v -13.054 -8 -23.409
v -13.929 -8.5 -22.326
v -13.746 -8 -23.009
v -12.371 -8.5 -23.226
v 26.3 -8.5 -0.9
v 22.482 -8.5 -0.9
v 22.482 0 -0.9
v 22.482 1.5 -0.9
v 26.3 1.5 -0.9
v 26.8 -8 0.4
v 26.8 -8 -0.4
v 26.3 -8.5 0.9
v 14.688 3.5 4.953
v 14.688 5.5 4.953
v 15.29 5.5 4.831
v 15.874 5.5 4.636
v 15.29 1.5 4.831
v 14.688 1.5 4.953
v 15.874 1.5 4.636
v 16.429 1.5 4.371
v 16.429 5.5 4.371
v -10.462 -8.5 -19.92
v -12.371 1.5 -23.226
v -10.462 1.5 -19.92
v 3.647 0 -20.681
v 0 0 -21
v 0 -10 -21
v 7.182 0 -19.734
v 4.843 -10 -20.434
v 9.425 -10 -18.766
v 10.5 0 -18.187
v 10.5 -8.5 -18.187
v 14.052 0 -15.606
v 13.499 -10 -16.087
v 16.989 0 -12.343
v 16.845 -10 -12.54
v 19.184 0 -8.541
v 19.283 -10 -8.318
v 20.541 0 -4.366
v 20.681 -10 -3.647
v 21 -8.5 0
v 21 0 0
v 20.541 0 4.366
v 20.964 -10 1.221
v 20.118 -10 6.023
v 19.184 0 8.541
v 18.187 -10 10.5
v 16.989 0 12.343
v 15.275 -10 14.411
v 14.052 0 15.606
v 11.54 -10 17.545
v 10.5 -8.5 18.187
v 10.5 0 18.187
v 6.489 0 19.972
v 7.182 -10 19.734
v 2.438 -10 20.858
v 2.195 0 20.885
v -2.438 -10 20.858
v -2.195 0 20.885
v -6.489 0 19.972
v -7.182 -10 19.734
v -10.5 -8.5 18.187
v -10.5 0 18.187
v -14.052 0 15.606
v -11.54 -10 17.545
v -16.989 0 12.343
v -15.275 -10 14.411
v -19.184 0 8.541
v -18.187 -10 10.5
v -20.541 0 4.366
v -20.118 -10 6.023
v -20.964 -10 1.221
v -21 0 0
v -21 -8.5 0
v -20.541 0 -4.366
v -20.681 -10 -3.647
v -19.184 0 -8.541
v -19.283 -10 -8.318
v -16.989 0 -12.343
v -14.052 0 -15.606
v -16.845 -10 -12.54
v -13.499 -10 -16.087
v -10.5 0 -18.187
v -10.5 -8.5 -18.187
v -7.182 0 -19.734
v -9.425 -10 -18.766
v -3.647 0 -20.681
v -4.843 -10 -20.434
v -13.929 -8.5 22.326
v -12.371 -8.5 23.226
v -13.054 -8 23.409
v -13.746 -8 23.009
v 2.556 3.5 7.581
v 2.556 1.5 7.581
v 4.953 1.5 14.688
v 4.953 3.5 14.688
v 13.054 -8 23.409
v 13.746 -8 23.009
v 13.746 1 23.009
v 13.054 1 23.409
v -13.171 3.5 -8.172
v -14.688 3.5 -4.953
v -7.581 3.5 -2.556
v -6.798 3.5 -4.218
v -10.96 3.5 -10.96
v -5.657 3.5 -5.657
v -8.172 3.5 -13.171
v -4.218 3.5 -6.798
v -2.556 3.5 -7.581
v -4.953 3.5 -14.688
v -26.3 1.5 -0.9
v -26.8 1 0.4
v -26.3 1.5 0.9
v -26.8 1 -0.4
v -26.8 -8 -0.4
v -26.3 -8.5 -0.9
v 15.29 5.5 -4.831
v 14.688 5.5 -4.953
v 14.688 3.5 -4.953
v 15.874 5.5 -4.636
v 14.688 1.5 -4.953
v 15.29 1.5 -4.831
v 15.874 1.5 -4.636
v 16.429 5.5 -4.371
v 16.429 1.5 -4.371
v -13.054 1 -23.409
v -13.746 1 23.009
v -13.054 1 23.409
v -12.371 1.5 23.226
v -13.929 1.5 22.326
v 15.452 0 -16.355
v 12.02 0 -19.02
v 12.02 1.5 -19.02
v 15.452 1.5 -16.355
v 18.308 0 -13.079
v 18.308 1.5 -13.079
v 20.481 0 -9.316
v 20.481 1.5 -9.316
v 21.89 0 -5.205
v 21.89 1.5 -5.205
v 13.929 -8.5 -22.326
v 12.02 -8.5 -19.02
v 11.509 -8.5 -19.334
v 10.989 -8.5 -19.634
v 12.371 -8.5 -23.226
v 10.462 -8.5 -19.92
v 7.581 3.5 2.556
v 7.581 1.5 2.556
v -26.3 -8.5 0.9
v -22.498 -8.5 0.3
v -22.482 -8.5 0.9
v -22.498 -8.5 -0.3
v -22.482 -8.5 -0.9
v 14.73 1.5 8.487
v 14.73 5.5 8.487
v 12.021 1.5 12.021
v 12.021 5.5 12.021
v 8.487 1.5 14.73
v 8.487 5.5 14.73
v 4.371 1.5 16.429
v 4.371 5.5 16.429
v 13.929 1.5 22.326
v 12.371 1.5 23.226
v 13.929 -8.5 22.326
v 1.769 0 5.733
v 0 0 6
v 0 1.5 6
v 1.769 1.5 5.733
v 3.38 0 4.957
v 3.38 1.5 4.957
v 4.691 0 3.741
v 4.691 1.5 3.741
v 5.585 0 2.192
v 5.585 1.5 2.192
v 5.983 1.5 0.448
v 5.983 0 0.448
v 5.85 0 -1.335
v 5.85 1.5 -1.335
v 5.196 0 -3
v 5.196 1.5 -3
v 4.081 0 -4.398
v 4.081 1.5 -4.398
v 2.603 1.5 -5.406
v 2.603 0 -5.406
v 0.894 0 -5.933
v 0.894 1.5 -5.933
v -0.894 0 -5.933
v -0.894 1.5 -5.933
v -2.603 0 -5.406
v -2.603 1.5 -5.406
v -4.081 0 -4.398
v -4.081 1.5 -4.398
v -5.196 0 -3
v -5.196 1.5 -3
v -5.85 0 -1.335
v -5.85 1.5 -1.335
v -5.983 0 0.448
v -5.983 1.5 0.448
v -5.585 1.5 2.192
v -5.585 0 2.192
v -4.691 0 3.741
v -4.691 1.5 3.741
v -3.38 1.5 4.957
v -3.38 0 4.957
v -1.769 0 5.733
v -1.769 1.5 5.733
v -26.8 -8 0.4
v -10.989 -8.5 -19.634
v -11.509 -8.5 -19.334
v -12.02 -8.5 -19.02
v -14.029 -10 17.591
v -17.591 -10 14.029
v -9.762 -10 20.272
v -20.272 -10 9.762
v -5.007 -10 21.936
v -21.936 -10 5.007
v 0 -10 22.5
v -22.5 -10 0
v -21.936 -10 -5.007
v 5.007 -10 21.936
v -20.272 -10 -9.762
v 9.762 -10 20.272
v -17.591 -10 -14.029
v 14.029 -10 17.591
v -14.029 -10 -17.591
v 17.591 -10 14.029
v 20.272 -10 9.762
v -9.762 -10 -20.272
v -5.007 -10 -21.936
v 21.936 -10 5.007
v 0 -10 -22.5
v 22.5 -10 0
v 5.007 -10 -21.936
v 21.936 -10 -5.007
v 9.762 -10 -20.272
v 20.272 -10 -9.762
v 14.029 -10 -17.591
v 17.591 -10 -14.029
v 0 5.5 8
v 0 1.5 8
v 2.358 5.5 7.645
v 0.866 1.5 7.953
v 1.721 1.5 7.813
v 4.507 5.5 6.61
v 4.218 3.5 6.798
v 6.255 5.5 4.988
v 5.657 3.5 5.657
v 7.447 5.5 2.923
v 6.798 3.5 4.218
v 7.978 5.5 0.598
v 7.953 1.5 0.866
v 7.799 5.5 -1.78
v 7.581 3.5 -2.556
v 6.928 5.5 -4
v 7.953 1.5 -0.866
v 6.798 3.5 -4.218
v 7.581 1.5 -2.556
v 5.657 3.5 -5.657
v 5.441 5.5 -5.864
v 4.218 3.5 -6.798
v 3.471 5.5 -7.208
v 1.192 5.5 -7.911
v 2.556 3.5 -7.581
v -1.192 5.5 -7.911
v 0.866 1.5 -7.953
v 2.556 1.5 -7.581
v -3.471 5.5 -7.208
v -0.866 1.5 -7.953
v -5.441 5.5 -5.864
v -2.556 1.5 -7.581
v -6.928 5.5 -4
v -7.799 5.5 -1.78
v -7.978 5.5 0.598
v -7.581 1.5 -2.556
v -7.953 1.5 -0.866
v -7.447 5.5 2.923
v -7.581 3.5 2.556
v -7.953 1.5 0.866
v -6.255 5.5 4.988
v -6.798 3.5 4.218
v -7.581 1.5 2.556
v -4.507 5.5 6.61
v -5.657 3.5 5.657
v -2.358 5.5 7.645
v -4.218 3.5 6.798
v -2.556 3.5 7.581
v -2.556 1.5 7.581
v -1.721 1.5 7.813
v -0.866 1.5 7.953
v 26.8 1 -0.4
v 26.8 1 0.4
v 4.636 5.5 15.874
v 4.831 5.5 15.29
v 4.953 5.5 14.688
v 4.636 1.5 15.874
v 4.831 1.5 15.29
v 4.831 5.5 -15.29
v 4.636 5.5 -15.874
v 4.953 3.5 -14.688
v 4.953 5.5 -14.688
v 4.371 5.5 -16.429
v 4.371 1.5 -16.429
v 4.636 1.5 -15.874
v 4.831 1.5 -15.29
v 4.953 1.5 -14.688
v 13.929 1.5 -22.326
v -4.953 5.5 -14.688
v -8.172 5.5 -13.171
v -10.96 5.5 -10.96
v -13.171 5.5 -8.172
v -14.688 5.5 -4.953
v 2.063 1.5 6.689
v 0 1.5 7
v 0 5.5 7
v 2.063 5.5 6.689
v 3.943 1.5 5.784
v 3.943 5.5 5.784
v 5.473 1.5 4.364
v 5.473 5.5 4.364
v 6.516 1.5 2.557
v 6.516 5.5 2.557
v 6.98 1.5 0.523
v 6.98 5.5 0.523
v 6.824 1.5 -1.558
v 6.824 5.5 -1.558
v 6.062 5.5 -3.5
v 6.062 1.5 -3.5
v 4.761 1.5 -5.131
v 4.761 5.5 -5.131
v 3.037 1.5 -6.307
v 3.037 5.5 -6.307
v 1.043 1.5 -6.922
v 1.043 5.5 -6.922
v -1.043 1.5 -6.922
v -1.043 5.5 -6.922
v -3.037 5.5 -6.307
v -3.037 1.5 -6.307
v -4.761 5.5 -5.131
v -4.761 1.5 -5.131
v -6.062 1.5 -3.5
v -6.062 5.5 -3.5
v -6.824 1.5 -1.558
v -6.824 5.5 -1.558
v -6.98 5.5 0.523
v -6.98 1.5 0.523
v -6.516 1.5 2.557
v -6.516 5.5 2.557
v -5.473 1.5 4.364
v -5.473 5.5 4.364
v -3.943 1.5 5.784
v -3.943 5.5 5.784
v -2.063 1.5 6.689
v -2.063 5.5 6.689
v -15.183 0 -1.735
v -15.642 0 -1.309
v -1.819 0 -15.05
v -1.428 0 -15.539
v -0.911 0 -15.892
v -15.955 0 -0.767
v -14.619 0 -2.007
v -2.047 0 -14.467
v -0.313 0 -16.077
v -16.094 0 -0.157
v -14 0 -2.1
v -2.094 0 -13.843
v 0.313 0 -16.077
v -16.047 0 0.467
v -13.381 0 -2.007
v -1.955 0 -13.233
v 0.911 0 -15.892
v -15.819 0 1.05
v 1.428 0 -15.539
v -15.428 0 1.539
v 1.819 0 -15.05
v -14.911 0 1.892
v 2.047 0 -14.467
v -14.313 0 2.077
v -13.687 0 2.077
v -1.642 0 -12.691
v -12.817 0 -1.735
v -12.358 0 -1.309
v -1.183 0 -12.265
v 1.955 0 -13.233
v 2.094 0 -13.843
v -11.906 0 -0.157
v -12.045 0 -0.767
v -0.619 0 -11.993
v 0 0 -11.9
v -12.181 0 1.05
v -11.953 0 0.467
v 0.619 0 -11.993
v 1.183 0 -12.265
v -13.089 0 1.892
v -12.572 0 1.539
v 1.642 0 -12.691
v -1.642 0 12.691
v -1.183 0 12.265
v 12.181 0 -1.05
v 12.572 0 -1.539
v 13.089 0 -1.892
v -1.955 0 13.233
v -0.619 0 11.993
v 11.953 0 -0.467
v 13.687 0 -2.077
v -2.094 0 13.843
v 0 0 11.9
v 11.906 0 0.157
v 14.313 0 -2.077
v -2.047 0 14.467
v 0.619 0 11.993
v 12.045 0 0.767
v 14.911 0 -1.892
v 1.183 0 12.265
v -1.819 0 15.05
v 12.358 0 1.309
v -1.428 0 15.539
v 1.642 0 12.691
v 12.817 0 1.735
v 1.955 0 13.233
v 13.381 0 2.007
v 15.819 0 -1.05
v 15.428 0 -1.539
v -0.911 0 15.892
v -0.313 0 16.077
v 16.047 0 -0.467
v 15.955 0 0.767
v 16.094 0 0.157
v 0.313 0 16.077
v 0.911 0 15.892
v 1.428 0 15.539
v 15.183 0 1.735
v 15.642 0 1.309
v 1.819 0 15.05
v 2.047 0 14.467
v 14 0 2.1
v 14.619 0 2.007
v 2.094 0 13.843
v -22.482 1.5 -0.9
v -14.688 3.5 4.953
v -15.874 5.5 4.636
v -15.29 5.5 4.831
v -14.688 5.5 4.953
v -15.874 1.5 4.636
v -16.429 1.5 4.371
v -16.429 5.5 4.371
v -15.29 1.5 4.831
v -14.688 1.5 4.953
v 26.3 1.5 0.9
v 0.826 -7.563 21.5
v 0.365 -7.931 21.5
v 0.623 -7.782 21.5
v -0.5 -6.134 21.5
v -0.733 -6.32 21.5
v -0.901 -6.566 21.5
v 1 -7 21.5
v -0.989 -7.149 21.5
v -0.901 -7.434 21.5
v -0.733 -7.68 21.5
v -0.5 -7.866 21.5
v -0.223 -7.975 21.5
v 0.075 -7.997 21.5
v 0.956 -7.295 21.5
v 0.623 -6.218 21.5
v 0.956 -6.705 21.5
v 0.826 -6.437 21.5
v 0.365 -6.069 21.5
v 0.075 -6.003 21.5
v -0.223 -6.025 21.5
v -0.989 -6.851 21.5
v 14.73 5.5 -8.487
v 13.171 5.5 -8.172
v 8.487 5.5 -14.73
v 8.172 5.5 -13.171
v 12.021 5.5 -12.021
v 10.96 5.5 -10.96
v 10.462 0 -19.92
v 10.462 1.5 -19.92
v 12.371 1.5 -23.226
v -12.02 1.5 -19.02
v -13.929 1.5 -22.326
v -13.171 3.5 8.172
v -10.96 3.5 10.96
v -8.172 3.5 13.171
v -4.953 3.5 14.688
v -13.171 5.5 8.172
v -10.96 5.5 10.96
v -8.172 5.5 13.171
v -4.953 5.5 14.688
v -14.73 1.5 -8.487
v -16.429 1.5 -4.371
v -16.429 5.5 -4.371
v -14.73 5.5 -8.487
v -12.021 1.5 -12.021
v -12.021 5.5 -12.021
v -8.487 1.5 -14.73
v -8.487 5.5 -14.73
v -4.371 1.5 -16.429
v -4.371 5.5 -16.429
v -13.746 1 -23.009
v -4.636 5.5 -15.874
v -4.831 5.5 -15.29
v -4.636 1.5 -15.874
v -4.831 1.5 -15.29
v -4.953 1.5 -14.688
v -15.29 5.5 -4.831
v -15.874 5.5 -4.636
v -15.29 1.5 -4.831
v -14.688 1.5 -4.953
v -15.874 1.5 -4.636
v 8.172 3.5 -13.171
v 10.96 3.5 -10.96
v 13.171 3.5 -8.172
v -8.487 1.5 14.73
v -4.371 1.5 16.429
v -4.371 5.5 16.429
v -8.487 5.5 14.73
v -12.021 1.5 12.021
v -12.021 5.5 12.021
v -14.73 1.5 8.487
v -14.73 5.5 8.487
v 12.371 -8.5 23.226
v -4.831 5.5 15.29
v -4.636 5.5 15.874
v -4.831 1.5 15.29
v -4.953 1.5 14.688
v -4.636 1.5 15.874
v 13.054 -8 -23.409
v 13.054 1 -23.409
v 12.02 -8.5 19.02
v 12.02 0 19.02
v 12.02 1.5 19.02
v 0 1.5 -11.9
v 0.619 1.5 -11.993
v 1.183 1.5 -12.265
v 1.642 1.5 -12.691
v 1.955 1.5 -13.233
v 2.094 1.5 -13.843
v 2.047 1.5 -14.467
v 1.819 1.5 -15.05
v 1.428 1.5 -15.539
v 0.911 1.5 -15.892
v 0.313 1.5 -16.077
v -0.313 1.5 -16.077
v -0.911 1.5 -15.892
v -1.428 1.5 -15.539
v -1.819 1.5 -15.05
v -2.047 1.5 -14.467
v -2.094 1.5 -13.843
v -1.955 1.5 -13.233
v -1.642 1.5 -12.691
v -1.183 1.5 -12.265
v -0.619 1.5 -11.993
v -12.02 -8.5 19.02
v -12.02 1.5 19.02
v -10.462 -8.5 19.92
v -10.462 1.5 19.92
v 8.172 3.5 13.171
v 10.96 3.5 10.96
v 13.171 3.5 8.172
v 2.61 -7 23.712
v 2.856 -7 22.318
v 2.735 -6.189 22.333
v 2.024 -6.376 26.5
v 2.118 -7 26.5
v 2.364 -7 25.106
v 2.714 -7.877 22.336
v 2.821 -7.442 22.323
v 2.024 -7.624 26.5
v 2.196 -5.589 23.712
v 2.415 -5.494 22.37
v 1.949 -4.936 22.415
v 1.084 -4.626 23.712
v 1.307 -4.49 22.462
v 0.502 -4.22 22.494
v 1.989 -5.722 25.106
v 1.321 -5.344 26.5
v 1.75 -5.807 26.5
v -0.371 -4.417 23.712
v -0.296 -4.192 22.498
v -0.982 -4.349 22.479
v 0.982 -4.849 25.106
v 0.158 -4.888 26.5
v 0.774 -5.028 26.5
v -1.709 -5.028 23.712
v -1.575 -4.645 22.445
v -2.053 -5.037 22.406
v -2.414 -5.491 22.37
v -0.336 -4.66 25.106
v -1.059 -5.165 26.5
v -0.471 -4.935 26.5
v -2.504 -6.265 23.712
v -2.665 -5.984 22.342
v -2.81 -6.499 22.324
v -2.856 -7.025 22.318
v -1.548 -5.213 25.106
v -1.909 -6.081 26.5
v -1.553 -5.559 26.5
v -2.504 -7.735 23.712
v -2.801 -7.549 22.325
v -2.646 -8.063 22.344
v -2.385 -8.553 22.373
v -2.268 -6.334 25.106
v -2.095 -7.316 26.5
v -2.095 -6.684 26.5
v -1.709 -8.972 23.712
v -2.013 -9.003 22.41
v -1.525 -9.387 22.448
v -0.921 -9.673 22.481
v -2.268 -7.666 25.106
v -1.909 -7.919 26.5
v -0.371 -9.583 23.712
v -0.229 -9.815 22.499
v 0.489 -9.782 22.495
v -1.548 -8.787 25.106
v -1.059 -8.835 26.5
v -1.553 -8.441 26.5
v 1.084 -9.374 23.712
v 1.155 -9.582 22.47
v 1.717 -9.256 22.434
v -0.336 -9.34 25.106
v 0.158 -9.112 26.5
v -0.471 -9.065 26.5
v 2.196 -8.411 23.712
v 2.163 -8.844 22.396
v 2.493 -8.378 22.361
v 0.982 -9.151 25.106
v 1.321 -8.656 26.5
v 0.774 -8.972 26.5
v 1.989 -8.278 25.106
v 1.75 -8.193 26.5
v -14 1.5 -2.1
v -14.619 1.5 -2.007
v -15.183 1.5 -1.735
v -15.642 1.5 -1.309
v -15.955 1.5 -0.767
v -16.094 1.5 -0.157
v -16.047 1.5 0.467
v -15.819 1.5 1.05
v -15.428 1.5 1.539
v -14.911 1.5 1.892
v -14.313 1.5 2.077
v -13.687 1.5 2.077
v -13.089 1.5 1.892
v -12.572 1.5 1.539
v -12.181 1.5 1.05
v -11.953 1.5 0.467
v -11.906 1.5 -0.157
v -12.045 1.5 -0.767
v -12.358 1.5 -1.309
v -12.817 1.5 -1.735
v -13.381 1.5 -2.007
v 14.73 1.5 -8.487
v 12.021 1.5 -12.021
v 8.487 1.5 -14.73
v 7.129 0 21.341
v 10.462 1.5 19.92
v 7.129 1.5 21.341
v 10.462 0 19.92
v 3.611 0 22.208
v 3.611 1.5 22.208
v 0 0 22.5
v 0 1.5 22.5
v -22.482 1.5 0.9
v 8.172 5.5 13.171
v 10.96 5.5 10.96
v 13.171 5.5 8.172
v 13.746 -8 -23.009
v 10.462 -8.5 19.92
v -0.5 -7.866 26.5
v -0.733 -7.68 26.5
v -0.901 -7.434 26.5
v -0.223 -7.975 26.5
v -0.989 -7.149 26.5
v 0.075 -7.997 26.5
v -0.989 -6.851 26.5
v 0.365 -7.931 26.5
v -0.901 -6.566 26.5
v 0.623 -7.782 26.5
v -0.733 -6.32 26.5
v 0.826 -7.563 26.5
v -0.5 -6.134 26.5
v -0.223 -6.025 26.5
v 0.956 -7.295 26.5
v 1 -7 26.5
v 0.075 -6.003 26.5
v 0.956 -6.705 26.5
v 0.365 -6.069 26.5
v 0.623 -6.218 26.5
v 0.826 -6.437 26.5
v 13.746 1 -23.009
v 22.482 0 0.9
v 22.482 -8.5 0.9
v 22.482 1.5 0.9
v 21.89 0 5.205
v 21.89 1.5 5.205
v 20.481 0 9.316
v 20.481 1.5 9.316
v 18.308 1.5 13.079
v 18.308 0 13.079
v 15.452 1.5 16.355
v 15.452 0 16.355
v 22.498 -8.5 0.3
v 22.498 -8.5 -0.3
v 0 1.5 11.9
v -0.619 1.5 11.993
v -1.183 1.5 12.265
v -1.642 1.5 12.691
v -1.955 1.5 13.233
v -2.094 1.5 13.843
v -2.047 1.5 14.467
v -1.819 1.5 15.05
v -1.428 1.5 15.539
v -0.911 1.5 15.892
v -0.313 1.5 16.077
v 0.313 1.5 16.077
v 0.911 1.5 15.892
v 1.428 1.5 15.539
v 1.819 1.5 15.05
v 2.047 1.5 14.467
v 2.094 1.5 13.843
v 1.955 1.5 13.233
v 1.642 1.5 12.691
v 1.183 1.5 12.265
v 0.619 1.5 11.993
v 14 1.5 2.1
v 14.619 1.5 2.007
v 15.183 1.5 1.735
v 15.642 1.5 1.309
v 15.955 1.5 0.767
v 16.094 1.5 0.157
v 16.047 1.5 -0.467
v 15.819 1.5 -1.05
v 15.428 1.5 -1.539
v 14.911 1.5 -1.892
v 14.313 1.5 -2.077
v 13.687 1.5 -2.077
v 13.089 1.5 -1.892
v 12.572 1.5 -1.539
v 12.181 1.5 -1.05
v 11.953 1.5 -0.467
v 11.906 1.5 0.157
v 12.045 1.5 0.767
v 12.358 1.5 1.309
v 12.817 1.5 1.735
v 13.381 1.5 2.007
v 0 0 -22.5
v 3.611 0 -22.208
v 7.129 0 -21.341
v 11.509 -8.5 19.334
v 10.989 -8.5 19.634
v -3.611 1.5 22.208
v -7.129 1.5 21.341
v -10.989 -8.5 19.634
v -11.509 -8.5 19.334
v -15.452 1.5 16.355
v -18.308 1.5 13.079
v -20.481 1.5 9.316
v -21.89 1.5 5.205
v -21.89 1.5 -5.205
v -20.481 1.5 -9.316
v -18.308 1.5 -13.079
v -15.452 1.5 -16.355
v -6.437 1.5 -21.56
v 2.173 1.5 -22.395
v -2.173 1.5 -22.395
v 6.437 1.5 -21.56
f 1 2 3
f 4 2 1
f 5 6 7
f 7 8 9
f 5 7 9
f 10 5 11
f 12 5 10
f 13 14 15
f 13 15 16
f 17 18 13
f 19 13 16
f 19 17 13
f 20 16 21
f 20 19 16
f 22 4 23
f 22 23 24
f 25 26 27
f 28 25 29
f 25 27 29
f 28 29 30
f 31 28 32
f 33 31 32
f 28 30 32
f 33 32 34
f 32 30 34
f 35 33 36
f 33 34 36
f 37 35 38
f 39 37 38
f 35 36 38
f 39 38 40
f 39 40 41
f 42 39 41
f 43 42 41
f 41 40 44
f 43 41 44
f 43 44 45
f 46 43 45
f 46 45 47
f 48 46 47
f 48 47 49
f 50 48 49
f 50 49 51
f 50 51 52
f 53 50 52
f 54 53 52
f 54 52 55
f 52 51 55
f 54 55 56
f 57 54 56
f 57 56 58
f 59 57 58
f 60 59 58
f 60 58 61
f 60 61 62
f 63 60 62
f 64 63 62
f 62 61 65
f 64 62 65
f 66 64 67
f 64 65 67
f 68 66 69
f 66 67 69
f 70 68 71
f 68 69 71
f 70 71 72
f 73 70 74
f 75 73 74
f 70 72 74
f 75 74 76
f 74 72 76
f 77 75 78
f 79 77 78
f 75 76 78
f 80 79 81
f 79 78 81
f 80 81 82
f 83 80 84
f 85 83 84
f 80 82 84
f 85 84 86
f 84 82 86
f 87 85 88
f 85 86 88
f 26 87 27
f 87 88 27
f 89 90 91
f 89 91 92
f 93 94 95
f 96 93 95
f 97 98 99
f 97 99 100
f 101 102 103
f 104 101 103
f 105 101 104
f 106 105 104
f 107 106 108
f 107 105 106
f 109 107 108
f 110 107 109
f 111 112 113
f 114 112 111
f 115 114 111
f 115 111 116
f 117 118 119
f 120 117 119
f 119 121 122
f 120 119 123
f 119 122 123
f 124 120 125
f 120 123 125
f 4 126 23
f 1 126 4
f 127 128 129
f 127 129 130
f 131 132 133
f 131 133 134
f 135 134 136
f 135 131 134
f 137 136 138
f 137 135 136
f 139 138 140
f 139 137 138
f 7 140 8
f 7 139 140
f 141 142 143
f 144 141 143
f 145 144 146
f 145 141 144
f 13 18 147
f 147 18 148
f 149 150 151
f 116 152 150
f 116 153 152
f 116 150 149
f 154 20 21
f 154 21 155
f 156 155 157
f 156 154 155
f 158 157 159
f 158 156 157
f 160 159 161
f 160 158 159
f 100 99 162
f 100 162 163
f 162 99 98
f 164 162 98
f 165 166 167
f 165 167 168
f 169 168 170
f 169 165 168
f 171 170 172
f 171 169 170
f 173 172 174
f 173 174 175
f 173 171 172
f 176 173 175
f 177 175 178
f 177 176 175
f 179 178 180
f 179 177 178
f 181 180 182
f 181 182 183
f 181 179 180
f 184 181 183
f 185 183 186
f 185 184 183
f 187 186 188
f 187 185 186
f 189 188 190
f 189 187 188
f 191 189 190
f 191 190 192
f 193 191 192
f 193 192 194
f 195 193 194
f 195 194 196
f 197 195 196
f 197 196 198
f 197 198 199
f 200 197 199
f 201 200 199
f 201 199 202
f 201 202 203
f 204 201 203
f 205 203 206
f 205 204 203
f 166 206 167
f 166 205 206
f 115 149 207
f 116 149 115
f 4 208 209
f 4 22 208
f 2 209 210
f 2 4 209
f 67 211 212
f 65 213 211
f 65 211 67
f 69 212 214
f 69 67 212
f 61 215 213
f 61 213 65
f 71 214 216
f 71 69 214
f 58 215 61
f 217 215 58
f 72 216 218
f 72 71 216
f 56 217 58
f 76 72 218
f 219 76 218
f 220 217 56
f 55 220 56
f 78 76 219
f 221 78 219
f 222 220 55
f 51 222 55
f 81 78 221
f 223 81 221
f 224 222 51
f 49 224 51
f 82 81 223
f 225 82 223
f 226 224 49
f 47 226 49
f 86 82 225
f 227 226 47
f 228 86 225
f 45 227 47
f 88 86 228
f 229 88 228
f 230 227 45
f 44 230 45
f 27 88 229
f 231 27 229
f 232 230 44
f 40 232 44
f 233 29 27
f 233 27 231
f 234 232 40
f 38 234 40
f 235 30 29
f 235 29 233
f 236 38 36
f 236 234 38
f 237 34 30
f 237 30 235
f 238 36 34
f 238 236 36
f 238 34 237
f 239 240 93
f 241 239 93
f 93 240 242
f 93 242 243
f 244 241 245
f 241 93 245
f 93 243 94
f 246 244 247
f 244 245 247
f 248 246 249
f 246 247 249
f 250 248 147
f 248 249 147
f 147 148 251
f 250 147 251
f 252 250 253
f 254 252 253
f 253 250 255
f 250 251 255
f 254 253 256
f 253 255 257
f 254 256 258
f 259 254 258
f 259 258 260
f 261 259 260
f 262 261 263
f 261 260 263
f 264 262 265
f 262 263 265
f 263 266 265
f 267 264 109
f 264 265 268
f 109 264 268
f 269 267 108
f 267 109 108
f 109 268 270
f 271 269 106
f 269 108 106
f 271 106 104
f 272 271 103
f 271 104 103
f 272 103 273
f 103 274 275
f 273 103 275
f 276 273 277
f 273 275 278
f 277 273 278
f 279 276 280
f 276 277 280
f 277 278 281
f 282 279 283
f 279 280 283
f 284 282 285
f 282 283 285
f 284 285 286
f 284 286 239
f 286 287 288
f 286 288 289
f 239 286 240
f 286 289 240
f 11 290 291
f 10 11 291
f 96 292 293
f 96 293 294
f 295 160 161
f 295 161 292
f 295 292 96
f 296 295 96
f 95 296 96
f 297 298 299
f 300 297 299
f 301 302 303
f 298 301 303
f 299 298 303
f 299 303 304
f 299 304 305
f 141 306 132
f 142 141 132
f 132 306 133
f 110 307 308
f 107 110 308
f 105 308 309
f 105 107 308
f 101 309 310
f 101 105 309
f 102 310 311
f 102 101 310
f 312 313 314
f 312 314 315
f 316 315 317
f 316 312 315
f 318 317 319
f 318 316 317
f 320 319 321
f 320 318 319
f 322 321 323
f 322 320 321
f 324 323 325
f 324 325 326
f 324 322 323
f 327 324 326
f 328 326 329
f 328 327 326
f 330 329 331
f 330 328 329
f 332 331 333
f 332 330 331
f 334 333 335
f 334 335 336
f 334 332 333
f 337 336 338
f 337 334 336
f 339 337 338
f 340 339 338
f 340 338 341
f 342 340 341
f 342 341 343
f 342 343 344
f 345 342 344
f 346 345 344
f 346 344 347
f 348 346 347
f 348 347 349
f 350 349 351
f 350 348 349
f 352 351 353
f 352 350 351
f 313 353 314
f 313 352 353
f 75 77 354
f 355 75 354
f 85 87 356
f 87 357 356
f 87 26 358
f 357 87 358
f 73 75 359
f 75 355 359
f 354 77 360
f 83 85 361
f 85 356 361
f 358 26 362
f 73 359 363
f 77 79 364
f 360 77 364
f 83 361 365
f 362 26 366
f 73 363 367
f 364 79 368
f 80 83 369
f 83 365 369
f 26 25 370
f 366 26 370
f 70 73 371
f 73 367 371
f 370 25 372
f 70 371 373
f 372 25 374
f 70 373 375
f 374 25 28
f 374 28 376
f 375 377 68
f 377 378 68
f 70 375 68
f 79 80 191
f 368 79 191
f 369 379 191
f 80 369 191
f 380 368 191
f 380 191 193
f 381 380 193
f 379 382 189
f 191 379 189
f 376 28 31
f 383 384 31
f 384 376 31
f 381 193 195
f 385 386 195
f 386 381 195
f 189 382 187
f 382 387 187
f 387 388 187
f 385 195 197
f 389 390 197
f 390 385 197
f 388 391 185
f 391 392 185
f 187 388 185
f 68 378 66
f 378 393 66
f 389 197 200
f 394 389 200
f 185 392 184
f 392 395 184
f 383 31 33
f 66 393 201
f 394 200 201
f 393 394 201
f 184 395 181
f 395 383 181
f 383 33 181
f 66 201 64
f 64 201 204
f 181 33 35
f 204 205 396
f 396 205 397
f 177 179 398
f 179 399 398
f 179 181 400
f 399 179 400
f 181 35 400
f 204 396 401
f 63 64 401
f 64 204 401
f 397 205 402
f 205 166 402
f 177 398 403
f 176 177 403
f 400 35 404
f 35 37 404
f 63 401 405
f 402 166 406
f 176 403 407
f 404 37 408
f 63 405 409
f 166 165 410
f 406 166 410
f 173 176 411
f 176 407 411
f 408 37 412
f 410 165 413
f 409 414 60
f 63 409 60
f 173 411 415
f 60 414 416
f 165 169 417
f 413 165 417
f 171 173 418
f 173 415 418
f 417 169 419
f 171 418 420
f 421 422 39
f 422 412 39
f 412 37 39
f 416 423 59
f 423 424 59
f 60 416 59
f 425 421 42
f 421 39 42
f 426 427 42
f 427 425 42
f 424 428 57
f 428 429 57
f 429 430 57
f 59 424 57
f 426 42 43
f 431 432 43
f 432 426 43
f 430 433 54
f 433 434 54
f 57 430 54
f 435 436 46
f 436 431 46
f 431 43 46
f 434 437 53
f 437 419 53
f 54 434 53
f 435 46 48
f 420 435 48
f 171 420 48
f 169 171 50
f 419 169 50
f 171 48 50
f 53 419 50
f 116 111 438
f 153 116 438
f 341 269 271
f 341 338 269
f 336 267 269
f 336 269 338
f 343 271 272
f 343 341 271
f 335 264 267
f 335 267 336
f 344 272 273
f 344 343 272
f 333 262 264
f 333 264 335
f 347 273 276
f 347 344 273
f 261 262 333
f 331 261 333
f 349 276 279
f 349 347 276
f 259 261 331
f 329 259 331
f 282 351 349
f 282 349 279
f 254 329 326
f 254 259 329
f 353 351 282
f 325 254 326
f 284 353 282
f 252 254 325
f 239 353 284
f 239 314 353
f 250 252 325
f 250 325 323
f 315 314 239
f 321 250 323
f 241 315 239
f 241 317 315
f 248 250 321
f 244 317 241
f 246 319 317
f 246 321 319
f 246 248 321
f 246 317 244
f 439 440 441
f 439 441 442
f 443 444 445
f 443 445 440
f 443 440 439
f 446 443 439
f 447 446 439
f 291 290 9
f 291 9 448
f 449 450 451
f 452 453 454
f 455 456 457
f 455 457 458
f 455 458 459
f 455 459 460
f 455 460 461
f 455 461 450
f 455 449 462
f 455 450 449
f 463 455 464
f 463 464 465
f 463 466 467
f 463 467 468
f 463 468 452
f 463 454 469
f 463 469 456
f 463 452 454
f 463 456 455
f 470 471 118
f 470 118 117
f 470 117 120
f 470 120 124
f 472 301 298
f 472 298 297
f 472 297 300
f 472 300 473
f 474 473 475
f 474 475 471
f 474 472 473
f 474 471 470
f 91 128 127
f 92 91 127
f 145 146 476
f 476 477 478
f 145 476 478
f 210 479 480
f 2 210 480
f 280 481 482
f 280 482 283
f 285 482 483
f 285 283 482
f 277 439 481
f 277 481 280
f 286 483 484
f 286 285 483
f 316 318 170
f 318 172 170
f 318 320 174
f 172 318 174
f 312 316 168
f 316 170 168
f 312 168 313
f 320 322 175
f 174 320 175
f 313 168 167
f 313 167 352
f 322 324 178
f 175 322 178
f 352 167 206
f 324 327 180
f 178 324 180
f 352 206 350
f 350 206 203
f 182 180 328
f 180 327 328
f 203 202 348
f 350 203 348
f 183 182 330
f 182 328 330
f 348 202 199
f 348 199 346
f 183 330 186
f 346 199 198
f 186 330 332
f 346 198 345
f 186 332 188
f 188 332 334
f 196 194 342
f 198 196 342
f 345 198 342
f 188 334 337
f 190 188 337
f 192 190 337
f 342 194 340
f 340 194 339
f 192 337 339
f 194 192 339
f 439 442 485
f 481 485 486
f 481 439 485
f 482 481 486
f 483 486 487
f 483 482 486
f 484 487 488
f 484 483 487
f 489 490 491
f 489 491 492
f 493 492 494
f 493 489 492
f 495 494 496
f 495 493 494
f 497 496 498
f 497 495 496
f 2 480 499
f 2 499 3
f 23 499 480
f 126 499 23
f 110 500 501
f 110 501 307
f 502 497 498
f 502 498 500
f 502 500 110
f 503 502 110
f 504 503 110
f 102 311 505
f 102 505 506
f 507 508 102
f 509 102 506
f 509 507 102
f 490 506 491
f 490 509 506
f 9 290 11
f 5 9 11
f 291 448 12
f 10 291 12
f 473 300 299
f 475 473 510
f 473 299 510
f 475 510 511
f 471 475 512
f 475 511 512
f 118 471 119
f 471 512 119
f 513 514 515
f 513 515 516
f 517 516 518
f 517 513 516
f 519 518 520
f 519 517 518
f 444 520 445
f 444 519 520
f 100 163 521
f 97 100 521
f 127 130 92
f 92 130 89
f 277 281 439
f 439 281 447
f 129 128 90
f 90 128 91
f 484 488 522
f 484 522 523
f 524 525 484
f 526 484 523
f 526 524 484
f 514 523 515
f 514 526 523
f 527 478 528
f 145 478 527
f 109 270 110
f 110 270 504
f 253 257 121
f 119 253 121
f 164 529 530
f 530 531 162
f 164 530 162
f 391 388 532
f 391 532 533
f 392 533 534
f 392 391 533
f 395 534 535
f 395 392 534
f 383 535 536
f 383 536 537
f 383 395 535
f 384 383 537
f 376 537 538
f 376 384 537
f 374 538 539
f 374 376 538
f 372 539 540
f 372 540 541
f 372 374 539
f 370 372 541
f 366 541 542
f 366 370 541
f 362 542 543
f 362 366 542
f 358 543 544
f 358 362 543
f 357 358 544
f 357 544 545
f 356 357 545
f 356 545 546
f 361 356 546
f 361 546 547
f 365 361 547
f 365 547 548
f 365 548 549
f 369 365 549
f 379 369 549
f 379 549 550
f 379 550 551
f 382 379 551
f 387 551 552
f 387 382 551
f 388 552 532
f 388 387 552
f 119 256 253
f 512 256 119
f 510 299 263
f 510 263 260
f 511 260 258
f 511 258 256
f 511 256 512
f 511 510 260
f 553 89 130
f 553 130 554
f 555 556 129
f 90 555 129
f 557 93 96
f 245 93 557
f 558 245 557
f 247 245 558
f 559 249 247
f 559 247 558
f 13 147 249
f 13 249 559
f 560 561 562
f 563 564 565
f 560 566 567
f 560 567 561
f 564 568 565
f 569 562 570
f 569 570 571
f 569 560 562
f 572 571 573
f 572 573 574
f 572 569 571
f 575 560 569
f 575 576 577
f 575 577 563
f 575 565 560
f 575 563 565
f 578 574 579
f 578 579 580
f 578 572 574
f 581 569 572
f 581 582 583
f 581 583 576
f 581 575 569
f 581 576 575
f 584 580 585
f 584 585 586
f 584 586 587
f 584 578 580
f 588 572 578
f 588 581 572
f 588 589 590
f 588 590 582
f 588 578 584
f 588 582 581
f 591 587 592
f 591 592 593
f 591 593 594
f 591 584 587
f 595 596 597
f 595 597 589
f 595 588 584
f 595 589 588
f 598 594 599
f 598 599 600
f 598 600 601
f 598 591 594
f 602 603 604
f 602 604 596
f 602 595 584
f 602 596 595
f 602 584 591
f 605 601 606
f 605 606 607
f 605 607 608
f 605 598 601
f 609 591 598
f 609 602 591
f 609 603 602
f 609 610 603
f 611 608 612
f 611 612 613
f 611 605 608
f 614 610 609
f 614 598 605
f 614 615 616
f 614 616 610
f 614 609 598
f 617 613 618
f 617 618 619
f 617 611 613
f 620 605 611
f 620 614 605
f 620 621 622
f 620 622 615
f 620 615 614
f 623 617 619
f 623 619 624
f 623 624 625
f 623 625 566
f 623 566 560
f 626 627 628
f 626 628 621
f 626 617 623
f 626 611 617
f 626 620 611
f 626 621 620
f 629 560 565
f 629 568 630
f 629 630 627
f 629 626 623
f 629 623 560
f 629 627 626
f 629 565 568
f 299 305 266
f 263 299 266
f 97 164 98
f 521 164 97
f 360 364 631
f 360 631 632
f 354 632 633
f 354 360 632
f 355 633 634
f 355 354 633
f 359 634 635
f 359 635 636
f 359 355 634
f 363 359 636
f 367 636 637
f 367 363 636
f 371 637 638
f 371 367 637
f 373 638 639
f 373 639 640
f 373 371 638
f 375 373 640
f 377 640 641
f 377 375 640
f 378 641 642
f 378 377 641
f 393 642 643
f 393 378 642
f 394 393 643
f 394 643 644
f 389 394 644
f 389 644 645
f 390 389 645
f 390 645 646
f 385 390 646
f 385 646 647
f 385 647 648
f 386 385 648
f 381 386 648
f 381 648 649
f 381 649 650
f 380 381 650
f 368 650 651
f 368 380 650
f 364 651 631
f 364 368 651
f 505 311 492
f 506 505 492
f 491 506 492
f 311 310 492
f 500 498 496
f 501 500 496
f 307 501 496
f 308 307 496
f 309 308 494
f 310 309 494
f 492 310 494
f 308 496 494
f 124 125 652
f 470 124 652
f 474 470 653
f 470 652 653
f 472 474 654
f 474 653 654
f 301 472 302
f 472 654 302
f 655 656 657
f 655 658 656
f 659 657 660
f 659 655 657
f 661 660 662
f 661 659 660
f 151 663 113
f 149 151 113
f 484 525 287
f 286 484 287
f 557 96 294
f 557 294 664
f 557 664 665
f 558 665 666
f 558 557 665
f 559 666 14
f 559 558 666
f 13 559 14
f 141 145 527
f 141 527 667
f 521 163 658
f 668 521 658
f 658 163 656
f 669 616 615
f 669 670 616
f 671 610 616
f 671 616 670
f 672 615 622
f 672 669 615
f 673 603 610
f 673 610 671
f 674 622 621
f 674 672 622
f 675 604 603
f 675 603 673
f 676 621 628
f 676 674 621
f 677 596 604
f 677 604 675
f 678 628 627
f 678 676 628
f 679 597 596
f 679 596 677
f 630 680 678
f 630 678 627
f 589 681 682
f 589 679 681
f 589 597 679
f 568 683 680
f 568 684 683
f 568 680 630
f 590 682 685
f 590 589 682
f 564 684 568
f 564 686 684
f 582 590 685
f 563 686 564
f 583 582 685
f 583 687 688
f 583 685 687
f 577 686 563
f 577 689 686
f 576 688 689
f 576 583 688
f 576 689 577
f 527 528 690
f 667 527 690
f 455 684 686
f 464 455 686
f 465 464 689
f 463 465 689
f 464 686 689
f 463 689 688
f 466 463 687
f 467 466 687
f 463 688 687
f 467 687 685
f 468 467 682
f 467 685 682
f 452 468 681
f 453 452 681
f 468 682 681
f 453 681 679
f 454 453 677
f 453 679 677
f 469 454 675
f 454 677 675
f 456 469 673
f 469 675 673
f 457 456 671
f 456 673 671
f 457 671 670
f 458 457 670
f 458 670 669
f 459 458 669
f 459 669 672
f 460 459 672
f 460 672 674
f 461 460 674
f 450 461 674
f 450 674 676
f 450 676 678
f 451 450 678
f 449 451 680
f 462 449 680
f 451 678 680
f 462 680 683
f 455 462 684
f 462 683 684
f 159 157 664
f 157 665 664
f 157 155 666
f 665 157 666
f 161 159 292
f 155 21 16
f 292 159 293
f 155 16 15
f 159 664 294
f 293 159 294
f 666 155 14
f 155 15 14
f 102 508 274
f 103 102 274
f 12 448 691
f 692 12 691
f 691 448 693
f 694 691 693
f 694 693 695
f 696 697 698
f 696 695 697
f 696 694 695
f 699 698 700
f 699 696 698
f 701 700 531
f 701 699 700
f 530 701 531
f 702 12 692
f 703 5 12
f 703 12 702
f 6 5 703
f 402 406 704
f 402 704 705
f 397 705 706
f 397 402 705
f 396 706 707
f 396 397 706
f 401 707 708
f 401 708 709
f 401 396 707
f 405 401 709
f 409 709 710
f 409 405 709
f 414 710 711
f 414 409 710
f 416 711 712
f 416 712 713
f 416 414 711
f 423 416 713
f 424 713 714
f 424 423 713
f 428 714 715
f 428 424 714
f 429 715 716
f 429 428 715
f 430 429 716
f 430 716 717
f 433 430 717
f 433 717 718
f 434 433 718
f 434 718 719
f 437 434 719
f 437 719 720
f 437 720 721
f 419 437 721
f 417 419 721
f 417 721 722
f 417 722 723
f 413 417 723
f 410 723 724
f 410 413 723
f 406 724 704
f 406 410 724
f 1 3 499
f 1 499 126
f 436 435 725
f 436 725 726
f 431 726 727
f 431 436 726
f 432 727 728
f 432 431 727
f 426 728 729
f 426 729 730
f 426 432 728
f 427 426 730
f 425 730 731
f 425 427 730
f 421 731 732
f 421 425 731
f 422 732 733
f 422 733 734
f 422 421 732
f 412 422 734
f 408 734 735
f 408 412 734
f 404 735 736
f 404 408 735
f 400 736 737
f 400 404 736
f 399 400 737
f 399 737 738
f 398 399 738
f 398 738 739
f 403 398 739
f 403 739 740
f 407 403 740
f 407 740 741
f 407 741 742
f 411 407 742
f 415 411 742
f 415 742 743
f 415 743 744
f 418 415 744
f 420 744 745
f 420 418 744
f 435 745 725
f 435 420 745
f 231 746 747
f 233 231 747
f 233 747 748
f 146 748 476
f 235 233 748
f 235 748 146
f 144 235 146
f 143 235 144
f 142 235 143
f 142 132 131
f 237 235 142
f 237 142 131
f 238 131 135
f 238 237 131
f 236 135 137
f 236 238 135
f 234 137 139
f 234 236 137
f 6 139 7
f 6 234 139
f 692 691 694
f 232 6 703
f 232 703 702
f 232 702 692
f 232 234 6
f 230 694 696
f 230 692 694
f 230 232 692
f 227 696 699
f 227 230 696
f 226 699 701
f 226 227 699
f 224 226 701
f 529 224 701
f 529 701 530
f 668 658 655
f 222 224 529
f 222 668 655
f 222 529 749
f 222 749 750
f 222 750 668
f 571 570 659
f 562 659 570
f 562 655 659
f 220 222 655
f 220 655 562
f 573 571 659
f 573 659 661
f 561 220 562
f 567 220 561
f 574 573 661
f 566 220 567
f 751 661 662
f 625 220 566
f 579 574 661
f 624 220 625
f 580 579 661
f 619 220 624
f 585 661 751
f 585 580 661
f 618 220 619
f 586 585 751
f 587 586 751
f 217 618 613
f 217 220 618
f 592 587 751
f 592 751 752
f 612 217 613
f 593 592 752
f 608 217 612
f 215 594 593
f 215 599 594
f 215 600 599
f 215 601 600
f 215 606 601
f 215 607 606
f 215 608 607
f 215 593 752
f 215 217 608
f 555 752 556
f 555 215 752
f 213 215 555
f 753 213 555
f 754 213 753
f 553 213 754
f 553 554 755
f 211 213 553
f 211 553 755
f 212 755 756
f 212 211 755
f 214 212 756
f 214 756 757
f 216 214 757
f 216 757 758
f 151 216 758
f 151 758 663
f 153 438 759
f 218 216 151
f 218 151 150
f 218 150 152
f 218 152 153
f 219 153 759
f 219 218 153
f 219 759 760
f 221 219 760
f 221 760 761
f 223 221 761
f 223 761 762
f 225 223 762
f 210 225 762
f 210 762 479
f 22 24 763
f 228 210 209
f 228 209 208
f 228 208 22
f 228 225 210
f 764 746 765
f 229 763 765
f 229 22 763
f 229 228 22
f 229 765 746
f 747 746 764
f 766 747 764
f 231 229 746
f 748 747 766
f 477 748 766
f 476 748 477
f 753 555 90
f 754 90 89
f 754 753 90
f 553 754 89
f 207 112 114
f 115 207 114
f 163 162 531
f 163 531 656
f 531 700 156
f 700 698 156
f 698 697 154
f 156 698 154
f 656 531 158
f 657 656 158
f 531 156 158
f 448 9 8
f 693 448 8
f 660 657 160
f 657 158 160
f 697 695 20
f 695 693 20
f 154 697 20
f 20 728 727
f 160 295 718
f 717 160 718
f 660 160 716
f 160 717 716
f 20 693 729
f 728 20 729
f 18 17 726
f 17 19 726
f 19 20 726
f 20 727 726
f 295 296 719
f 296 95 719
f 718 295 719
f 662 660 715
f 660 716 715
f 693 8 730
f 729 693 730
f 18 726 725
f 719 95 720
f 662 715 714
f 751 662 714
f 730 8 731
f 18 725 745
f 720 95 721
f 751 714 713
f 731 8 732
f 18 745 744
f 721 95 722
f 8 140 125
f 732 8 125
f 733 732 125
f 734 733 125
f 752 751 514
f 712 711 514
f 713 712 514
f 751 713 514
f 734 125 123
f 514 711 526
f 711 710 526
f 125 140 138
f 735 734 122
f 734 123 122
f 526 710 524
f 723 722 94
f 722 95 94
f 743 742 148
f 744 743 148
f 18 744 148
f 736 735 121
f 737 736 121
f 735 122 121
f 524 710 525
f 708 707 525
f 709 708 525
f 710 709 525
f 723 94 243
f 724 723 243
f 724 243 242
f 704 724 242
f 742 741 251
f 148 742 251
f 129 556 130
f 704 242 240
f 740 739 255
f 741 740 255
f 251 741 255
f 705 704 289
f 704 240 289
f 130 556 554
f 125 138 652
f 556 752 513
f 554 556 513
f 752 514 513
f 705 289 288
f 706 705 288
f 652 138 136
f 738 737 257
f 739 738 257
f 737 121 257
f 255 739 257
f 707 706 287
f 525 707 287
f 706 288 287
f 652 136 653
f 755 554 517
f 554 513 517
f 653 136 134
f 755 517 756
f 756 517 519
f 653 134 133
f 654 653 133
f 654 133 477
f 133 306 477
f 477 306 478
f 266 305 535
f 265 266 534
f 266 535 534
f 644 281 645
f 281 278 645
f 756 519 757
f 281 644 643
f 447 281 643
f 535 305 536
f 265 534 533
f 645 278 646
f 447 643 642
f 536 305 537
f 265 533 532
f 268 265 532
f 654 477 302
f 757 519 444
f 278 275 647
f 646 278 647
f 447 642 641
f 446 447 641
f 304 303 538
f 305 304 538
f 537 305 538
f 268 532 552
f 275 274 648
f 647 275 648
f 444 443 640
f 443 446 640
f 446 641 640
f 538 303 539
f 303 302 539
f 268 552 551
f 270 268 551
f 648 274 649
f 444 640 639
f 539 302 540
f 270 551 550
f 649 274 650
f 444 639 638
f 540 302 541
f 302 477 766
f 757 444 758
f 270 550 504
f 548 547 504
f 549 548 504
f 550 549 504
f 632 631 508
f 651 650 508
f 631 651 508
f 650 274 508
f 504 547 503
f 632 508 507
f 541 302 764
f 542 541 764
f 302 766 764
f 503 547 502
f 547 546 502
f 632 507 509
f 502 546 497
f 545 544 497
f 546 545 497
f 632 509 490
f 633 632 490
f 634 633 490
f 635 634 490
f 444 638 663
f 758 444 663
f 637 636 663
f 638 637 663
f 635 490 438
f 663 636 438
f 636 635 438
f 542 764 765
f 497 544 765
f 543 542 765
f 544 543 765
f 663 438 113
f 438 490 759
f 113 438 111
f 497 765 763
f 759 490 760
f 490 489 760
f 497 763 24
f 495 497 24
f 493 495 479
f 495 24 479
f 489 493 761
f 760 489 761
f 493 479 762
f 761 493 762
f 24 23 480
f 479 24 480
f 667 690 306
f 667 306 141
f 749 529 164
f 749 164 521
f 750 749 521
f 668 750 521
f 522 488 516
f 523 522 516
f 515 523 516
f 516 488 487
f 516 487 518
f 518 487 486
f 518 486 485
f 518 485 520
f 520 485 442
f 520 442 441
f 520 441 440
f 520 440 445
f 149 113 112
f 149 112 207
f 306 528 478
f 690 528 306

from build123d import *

# Parameters (mm, degrees)
SKETCH_2_R          = 22.5
SKETCH_2_R_2        = 2.0999999999999956
SKETCH_2_R_3        = 2.1
SKETCH_2_R_4        = 2.0999999999999974
SKETCH_2_R_5        = 6
EXTRUDE_1_DEPTH     = 1.5
EXTRUDE_START       = 10
SKETCH_4_R          = 22.500000000000004
SKETCH_4_R_2        = 21
EXTRUDE_2_DEPTH     = 10
EXTRUDE_3_DEPTH     = 10
SKETCH_6_R          = 8
SKETCH_6_R_2        = 7
EXTRUDE_4_DEPTH     = 4
EXTRUDE_5_DEPTH     = 2
CHAMFER_1_SIZE      = 0.5
EXTRUDE_START_2     = 21.5
SKETCH_9_R          = 3
EXTRUDE_6_DEPTH     = 5
EXTRUDE_6_TAPER     = 10.000000000000021
SKETCH_10_R         = 1
CUT_EXTRUDE_1_DEPTH = 5


with BuildPart() as part:
    # 草图2 → 凸台-拉伸1 (new body)
    with BuildSketch(Plane(origin=(0, 0, 0), x_dir=(1, 0, 0), z_dir=(0, 1, 0))):
        with Locations(Location((0, 0, 0), (0, 0, 270))):
            Circle(SKETCH_2_R)
        with Locations(Location((14, 0, 0), (0, 0, 270))):
            Circle(SKETCH_2_R_2, mode=Mode.SUBTRACT)
        with Locations(Location((0, 14, 0), (0, 0, 270))):
            Circle(SKETCH_2_R_3, mode=Mode.SUBTRACT)
        with Locations(Location((0, -14, 0), (0, 0, 90))):
            Circle(SKETCH_2_R_3, mode=Mode.SUBTRACT)
        with Locations(Location((-13.999999999999993, -3.43e-15, 0), (0, 0, 90))):
            Circle(SKETCH_2_R_4, mode=Mode.SUBTRACT)
        with Locations(Location((0, 0, 0), (0, 0, 270))):
            Circle(SKETCH_2_R_5, mode=Mode.SUBTRACT)
    extrude(amount=EXTRUDE_1_DEPTH)

    # 草图4 → 凸台-拉伸2 (add)
    with BuildSketch(Plane.XZ.offset(EXTRUDE_START)):
        with Locations(Location((0, 0, 0), (0, 0, 270))):
            Circle(SKETCH_4_R)
        with Locations(Location((0, 0, 0), (0, 0, 270))):
            Circle(SKETCH_4_R_2, mode=Mode.SUBTRACT)
    extrude(amount=-EXTRUDE_2_DEPTH)

    # 草图5 → 凸台-拉伸3 (add)
    with BuildSketch(Plane(origin=(0, 1.5, 0), x_dir=(1, 0, 0), z_dir=(0, 1, 0))):
        Polygon((26.8, 0.9), (26.8, -0.9), (21, -0.9000000000000008), (21, 0.9000000000000008), align=None)
        Polygon((12.620577136594008, -23.659480821422953), (9.720577136594008, -18.63653347947321), (11.279422863405998, -17.736533479473213), (14.179422863405998, -22.759480821422954), align=None)
        Polygon((-14.179422863405991, -22.759480821422965), (-11.279422863405994, -17.736533479473213), (-9.720577136594002, -18.636533479473215), (-12.620577136594001, -23.65948082142296), align=None)
        Polygon((-26.8, 0.8999999999999966), (-21, 0.8999999999999982), (-21, -0.9000000000000035), (-26.8, -0.9000000000000032), align=None)
        Polygon((-12.620577136594019, 23.65948082142295), (-9.720577136594015, 18.63653347947321), (-11.279422863406003, 17.73653347947321), (-14.179422863406007, 22.75948082142295), align=None)
        Polygon((14.179422863405977, 22.75948082142297), (11.279422863405983, 17.736533479473216), (9.72057713659399, 18.63653347947322), (12.620577136593988, 23.659480821422964), align=None)
    extrude(amount=-EXTRUDE_3_DEPTH)

    # 草图6 → 凸台-拉伸4 (add)
    # profile 1 of 5: a face of its own
    with BuildSketch(Plane(origin=(0, 1.5, 0), x_dir=(1, 0, 0), z_dir=(0, 1, 0))):
        with Locations(Location((0, 0, 0), (0, 0, 270))):
            Circle(SKETCH_6_R)
        with Locations(Location((0, 0, 0), (0, 0, 270))):
            Circle(SKETCH_6_R_2, mode=Mode.SUBTRACT)
    # profile 2 of 5: a face of its own
    with BuildSketch(Plane(origin=(0, 1.5, 0), x_dir=(1, 0, 0), z_dir=(0, 1, 0))):
        with BuildLine():
            ThreePointArc((16.42857142857143, 4.370588154508102), (12.02081528017131, 12.020815280171309), (4.370588154508102, 16.42857142857143))
            ThreePointArc((4.370588154508102, 16.42857142857143), (4.74213736554837, 15.584971042722852), (4.952508833914383, 14.6875))
            ThreePointArc((4.952508833914383, 14.6875), (10.960155108391488, 10.960155108391486), (14.687500000000002, 4.952508833914381))
            ThreePointArc((14.687500000000002, 4.952508833914381), (15.584971042722852, 4.742137365548372), (16.42857142857143, 4.370588154508102))
        make_face()
    # profile 3 of 5: a face of its own
    with BuildSketch(Plane(origin=(0, 1.5, 0), x_dir=(1, 0, 0), z_dir=(0, 1, 0))):
        with BuildLine():
            ThreePointArc((4.370588154508102, -16.42857142857143), (4.742137365548372, -15.584971042722852), (4.952508833914385, -14.6875))
            ThreePointArc((4.952508833914385, -14.6875), (10.960155108391488, -10.960155108391486), (14.687500000000002, -4.952508833914381))
            ThreePointArc((14.687500000000002, -4.952508833914381), (15.584971042722852, -4.742137365548368), (16.42857142857143, -4.370588154508102))
            ThreePointArc((16.42857142857143, -4.370588154508102), (12.02081528017131, -12.020815280171309), (4.370588154508102, -16.42857142857143))
        make_face()
    # profile 4 of 5: a face of its own
    with BuildSketch(Plane(origin=(0, 1.5, 0), x_dir=(1, 0, 0), z_dir=(0, 1, 0))):
        with BuildLine():
            ThreePointArc((-14.687500000000002, 4.952508833914374), (-15.584971042722852, 4.742137365548359), (-16.42857142857143, 4.370588154508093))
            ThreePointArc((-16.42857142857143, 4.370588154508093), (-12.020815280171314, 12.020815280171306), (-4.370588154508102, 16.42857142857143))
            ThreePointArc((-4.370588154508102, 16.42857142857143), (-4.742137365548372, 15.584971042722854), (-4.952508833914383, 14.6875))
            ThreePointArc((-4.952508833914383, 14.6875), (-10.960155108391486, 10.960155108391488), (-14.687500000000002, 4.952508833914374))
        make_face()
    # profile 5 of 5: a face of its own
    with BuildSketch(Plane(origin=(0, 1.5, 0), x_dir=(1, 0, 0), z_dir=(0, 1, 0))):
        with BuildLine():
            ThreePointArc((-4.952508833914385, -14.6875), (-4.742137365548372, -15.584971042722854), (-4.370588154508102, -16.42857142857143))
            ThreePointArc((-4.370588154508102, -16.42857142857143), (-12.020815280171309, -12.02081528017131), (-16.42857142857143, -4.370588154508101))
            ThreePointArc((-16.42857142857143, -4.370588154508101), (-15.584971042722854, -4.742137365548372), (-14.687500000000002, -4.952508833914382))
            ThreePointArc((-14.687500000000002, -4.952508833914382), (-10.960155108391486, -10.960155108391488), (-4.952508833914385, -14.6875))
        make_face()
    extrude(amount=EXTRUDE_4_DEPTH)

    # 草图7 → 凸台-拉伸5 (add)
    with BuildSketch(Plane(origin=(0, 1.5, 0), x_dir=(1, 0, 0), z_dir=(0, 1, 0))):
        with BuildLine():
            Line((14.687500000000002, -4.952508833914384), (7.580645161290323, -2.5561335916977446))
            ThreePointArc((7.580645161290323, -2.5561335916977446), (5.6568542494923815, -5.656854249492379), (2.5561335916977472, -7.580645161290323))
            Line((2.5561335916977472, -7.580645161290323), (4.952508833914385, -14.6875))
            ThreePointArc((4.952508833914385, -14.6875), (10.960155108391488, -10.960155108391486), (14.687500000000002, -4.952508833914384))
        make_face()
        with BuildLine():
            Line((-4.952508833914393, -14.6875), (-2.5561335916977583, -7.580645161290323))
            ThreePointArc((-2.5561335916977583, -7.580645161290323), (-5.656854249492388, -5.656854249492378), (-7.580645161290336, -2.5561335916977517))
            Line((-7.580645161290336, -2.5561335916977517), (-14.687500000000014, -4.952508833914387))
            ThreePointArc((-14.687500000000014, -4.952508833914387), (-10.960155108391493, -10.960155108391485), (-4.952508833914393, -14.6875))
        make_face()
        with BuildLine():
            Line((-14.687500000000014, 4.952508833914387), (-7.580645161290336, 2.5561335916977517))
            ThreePointArc((-7.580645161290336, 2.5561335916977517), (-5.656854249492388, 5.656854249492378), (-2.5561335916977583, 7.580645161290323))
            Line((-2.5561335916977583, 7.580645161290323), (-4.952508833914393, 14.6875))
            ThreePointArc((-4.952508833914393, 14.6875), (-10.960155108391493, 10.960155108391485), (-14.687500000000014, 4.952508833914387))
        make_face()
        with BuildLine():
            Line((4.952508833914385, 14.6875), (2.5561335916977472, 7.580645161290323))
            ThreePointArc((2.5561335916977472, 7.580645161290323), (5.6568542494923815, 5.656854249492379), (7.580645161290323, 2.5561335916977446))
            Line((7.580645161290323, 2.5561335916977446), (14.687500000000002, 4.952508833914381))
            ThreePointArc((14.687500000000002, 4.952508833914381), (10.960155108391488, 10.960155108391486), (4.952508833914385, 14.6875))
        make_face()
    extrude(amount=EXTRUDE_5_DEPTH)

    # 倒角1
    chamfer_1_edges = [part.edges().sort_by_distance(p)[0] for p in [
        (-26.8, -3.5, -0.8999999999999966),
        (-26.8, -8.5, 3.33e-15),
        (-26.8, -3.5, 0.9000000000000032),
        (-26.8, 1.5, 3.33e-15),
        (-12.620577136594019, -3.5, -23.65948082142295),
        (-13.400000000000013, -8.5, -23.20948082142295),
        (-14.179422863406007, -3.5, -22.75948082142295),
        (-13.400000000000013, 1.5, -23.20948082142295),
        (14.179422863405977, -3.5, -22.75948082142297),
        (13.399999999999983, -8.5, -23.209480821422964),
        (12.620577136593988, -3.5, -23.659480821422964),
        (13.399999999999983, 1.5, -23.209480821422964),
        (26.8, -3.5, 0.9),
        (26.8, -8.5, 0),
        (26.8, -3.5, -0.9),
        (26.8, 1.5, 0),
        (12.620577136594008, -3.5, 23.659480821422953),
        (13.400000000000002, -8.5, 23.209480821422954),
        (14.179422863405998, -3.5, 22.759480821422954),
        (13.400000000000002, 1.5, 23.209480821422954),
        (-14.179422863405991, -3.5, 22.759480821422965),
        (-13.399999999999995, -8.5, 23.209480821422964),
        (-12.620577136594001, -3.5, 23.65948082142296),
        (-13.399999999999995, 1.5, 23.209480821422964),
    ]]
    chamfer(chamfer_1_edges, length=CHAMFER_1_SIZE)

    # 草图9 → 凸台-拉伸6 (add)
    with BuildSketch(Plane.XY.offset(EXTRUDE_START_2)):
        with Locations((8.6e-16, -7)):
            Circle(SKETCH_9_R)
    extrude(amount=EXTRUDE_6_DEPTH, taper=EXTRUDE_6_TAPER)

    # 草图10 → 切除-拉伸1 (cut)
    with BuildSketch(Plane.XY.offset(26.5)):
        with Locations((8.6e-16, -7)):
            Circle(SKETCH_10_R)
    extrude(amount=-CUT_EXTRUDE_1_DEPTH, mode=Mode.SUBTRACT)


solid = part.part
